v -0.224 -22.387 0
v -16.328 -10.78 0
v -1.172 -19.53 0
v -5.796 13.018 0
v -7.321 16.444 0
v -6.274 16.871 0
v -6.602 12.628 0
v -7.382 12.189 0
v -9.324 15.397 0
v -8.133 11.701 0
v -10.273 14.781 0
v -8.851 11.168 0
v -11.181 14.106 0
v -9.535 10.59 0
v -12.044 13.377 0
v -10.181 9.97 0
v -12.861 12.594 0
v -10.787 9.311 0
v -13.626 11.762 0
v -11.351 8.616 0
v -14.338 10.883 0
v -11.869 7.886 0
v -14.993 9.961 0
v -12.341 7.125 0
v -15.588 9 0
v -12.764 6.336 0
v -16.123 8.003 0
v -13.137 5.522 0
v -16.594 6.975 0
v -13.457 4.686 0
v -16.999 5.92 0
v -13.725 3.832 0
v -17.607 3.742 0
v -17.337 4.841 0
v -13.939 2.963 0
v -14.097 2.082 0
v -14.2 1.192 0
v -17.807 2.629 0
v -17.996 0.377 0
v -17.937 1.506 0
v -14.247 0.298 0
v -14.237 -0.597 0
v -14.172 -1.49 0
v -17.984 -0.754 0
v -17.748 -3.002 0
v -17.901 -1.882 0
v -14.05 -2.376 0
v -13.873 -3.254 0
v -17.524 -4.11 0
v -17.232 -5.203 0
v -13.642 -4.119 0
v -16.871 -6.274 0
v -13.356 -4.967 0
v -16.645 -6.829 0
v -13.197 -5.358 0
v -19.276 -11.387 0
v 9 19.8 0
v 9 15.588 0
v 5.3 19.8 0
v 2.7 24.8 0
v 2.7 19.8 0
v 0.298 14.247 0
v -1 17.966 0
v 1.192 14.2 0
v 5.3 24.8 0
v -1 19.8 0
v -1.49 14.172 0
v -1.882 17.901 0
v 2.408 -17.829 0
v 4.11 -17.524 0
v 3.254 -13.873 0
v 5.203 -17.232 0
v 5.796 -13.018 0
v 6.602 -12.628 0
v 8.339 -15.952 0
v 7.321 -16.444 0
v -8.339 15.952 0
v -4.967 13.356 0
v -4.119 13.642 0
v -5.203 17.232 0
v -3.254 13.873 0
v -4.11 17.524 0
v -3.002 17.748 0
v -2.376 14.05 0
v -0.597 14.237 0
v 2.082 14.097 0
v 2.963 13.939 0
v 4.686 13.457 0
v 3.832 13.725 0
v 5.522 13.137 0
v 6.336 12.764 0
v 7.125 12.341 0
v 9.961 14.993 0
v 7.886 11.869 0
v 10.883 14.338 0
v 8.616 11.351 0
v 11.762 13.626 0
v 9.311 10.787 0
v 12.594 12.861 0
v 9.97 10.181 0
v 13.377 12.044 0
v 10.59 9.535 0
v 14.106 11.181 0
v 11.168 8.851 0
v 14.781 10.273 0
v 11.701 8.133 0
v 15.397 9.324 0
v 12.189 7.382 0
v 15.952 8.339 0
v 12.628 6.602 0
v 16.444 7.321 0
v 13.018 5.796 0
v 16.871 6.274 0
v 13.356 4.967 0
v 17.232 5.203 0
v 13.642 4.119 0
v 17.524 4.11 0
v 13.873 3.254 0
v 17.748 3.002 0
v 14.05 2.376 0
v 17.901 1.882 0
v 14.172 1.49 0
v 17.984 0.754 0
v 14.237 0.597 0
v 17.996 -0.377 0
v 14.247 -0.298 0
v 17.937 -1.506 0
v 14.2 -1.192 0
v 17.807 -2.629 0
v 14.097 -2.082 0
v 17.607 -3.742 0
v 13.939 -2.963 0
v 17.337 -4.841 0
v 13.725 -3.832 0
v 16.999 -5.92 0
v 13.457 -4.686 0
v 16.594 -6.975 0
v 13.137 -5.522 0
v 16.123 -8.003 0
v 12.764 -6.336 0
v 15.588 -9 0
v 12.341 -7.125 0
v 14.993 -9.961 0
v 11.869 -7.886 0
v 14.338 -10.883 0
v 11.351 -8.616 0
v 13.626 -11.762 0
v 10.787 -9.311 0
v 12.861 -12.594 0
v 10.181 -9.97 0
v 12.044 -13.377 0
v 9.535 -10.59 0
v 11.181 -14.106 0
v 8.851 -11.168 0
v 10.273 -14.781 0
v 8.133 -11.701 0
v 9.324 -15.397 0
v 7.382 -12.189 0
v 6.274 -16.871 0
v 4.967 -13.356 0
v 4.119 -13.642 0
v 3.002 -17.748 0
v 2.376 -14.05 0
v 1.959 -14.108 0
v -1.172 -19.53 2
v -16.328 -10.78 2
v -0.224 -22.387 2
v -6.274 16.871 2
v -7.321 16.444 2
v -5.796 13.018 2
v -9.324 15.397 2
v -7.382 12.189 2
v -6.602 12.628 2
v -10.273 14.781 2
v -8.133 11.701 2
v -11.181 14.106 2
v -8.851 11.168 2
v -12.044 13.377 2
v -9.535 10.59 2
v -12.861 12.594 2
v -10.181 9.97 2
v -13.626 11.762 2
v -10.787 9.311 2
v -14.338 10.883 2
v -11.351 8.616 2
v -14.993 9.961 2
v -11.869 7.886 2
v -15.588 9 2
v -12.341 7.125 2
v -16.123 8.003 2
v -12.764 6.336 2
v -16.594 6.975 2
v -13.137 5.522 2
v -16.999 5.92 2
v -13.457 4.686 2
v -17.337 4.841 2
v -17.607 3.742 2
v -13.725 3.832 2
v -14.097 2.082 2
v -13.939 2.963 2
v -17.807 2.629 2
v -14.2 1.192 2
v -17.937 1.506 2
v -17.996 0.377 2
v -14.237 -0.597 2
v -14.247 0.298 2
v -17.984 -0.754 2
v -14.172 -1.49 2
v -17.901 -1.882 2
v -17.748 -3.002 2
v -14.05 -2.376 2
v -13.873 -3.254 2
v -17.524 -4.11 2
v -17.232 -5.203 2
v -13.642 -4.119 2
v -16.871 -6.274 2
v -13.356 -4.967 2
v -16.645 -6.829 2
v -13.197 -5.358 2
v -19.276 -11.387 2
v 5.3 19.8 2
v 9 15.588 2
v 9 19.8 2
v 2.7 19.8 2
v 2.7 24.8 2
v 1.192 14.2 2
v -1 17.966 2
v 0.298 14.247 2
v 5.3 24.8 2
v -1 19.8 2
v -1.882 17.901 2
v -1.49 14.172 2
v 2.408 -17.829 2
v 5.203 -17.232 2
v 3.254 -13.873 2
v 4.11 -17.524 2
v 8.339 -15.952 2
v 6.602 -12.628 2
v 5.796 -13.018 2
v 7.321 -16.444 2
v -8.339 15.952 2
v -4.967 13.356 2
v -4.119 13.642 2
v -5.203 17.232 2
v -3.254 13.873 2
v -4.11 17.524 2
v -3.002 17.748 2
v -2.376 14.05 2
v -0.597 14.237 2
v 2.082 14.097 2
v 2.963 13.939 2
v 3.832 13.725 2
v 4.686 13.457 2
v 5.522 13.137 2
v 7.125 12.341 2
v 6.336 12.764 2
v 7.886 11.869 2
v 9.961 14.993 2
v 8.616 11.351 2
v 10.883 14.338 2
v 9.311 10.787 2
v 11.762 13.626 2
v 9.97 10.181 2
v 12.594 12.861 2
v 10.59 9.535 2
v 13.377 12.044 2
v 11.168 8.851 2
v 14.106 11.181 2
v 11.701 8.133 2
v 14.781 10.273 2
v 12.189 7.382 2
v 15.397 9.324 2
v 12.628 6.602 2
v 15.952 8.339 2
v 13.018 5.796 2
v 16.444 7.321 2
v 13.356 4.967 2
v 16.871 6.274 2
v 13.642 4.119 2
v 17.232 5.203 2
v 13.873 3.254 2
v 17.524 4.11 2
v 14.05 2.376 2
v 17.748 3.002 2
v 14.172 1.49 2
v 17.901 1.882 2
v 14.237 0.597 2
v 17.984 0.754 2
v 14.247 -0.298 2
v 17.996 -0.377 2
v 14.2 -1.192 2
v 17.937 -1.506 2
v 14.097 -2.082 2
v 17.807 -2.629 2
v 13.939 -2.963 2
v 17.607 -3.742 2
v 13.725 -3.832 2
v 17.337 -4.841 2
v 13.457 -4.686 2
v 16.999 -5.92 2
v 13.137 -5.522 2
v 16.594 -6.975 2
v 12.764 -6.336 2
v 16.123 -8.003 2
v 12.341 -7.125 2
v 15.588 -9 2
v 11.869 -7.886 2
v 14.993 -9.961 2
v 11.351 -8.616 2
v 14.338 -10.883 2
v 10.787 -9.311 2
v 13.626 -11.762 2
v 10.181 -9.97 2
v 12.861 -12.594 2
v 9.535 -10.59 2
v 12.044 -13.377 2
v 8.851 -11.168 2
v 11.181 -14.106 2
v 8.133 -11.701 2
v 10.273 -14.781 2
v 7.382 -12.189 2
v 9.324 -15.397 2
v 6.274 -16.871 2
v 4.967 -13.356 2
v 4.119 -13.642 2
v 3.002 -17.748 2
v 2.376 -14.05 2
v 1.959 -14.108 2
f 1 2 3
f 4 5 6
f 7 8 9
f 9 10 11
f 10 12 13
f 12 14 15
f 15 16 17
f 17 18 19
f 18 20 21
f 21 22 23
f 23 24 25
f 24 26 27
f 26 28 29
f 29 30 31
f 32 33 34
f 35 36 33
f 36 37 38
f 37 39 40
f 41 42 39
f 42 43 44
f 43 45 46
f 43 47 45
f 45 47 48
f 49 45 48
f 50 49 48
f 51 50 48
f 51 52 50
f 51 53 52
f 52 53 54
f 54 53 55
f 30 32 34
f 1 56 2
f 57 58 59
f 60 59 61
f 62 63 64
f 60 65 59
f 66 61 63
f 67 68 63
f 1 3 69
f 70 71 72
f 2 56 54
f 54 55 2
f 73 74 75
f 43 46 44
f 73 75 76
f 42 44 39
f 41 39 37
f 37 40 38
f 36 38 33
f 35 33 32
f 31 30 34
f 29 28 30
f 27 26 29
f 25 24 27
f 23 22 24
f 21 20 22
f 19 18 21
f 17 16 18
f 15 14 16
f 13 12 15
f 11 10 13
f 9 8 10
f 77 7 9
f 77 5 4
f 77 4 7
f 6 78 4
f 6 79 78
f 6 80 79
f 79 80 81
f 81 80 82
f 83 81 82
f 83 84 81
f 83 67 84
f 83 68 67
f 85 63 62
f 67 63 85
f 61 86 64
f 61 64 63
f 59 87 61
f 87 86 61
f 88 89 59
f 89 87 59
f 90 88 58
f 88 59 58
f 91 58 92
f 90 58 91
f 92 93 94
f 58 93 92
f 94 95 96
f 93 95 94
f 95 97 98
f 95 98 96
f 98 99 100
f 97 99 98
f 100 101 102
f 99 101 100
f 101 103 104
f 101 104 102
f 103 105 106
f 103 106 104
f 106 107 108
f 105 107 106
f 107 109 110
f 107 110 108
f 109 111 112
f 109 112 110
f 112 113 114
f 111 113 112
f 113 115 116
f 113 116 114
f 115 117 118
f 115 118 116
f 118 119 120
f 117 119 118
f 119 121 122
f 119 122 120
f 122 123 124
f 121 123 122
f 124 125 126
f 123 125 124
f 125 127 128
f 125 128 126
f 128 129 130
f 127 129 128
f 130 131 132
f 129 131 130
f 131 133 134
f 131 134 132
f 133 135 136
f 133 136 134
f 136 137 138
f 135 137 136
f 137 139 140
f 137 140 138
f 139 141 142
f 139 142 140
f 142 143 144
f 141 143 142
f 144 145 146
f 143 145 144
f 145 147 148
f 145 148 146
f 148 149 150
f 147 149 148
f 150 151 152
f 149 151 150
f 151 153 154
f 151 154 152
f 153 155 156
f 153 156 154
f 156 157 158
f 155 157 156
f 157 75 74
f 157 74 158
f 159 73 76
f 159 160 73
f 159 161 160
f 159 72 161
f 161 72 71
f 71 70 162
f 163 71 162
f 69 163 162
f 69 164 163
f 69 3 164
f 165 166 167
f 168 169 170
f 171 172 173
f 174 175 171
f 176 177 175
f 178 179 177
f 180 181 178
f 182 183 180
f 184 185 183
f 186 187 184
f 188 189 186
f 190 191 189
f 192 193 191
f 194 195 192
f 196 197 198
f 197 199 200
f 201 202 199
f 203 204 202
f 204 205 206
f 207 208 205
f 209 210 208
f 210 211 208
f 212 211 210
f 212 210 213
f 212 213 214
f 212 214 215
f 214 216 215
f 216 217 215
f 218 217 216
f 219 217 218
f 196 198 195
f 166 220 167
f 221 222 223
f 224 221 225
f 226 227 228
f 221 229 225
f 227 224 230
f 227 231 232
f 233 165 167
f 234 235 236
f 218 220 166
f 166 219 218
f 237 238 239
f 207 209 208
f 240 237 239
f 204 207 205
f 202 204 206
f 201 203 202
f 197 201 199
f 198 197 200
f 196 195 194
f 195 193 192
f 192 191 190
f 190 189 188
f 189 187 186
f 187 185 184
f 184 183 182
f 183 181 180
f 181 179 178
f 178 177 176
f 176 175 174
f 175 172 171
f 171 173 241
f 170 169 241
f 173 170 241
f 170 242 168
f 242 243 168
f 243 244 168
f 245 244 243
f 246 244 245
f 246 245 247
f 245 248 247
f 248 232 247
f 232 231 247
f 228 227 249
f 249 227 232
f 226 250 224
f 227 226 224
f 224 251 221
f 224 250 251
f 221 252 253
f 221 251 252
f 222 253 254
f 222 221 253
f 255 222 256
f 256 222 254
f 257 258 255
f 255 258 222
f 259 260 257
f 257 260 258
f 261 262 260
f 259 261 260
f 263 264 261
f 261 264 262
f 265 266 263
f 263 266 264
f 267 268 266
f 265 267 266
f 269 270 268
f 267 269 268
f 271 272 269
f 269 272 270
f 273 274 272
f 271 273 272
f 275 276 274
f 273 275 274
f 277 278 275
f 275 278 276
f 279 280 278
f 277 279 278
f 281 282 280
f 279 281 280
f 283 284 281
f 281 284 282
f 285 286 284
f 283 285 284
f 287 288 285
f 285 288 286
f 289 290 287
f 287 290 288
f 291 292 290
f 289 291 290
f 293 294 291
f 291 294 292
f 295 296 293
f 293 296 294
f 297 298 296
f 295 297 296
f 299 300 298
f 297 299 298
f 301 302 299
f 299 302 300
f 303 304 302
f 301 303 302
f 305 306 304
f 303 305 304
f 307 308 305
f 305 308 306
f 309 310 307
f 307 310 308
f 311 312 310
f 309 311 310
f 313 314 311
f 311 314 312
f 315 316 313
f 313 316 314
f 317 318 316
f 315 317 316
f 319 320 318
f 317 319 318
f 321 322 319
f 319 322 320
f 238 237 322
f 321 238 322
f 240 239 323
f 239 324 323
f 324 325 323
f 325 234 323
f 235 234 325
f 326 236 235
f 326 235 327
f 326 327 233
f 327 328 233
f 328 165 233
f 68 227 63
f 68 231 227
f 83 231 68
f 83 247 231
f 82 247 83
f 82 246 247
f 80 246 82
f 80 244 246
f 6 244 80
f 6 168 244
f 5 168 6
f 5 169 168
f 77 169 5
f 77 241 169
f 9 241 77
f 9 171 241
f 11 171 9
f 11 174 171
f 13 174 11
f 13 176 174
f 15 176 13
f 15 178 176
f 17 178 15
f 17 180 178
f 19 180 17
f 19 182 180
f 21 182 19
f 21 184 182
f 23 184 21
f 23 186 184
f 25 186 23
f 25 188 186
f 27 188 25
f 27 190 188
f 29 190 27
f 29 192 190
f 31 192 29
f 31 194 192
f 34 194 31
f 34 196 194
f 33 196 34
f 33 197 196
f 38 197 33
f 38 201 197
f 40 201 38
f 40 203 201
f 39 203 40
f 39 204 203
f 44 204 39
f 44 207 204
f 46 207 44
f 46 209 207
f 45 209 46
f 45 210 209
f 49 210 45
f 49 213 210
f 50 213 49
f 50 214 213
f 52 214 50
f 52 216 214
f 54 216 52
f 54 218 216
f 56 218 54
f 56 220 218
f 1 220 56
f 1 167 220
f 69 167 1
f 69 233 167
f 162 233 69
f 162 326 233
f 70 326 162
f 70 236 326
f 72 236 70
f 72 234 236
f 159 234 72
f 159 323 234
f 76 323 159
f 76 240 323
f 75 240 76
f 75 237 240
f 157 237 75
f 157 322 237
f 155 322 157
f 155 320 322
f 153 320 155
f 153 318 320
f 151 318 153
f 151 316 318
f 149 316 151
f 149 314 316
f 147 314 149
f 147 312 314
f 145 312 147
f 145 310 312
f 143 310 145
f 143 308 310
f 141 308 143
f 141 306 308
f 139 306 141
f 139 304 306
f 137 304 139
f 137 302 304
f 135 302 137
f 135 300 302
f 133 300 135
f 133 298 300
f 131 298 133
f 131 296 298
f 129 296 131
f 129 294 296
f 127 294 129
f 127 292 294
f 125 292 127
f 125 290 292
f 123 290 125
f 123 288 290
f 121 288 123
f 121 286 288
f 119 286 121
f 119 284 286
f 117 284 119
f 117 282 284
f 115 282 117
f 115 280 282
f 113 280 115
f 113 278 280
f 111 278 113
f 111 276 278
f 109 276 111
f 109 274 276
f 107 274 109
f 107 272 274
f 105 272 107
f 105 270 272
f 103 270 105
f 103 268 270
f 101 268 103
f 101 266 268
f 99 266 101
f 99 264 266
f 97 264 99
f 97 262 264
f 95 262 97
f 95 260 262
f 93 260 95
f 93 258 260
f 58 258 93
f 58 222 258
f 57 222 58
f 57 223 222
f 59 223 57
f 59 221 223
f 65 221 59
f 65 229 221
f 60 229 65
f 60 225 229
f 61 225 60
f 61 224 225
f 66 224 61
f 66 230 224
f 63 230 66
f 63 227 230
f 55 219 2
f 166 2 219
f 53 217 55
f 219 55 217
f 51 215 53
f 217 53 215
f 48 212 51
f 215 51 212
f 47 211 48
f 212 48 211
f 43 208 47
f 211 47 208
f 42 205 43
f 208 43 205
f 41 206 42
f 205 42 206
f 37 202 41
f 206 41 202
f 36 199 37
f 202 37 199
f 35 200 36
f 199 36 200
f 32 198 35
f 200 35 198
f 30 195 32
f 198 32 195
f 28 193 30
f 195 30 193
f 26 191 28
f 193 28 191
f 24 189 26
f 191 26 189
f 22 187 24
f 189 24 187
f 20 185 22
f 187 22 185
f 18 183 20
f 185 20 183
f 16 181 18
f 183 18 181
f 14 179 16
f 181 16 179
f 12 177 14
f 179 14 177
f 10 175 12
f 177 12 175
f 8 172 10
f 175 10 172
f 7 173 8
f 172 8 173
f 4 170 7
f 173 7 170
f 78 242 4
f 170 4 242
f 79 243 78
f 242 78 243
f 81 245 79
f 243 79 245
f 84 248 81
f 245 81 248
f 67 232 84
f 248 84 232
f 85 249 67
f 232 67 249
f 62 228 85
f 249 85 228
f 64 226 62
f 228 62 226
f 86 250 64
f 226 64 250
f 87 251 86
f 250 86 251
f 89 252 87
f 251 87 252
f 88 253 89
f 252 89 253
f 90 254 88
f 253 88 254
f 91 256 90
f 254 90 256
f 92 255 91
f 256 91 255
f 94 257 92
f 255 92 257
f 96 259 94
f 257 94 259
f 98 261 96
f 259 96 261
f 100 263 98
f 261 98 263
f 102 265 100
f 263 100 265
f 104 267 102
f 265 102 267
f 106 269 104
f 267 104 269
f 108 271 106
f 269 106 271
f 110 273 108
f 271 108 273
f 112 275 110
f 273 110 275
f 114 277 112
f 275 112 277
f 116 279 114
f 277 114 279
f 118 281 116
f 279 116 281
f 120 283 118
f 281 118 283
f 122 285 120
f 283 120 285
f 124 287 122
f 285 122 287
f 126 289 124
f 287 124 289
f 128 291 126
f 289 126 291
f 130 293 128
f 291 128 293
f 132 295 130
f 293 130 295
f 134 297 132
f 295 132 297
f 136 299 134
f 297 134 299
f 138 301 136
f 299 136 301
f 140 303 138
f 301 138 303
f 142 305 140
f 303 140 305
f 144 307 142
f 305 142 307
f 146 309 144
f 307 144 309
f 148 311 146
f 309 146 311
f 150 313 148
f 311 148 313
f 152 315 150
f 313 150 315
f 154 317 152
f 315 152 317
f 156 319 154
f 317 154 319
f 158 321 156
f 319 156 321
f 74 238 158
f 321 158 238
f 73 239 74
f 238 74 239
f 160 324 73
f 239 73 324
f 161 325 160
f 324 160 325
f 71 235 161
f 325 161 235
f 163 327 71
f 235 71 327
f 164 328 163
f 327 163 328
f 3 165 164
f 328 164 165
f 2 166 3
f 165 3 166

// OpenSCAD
linear_extrude(height=2) {
    rotate(-30) union() {
        difference() {
            union() {
                circle(d=36,$fn=100);
                translate([-11,-17.5-2]) square([22,10]);
            }
            circle(d=28.5,$fn=100);
            translate([-8.75,-17.5]) square([17.5,10]);
        }
        
    }
    
    translate([sin(30)*8-5,15]) square([10,9-4.2]);
    translate([sin(30)*8-1.3,24-4.2]) square([2.6,5]);
}
